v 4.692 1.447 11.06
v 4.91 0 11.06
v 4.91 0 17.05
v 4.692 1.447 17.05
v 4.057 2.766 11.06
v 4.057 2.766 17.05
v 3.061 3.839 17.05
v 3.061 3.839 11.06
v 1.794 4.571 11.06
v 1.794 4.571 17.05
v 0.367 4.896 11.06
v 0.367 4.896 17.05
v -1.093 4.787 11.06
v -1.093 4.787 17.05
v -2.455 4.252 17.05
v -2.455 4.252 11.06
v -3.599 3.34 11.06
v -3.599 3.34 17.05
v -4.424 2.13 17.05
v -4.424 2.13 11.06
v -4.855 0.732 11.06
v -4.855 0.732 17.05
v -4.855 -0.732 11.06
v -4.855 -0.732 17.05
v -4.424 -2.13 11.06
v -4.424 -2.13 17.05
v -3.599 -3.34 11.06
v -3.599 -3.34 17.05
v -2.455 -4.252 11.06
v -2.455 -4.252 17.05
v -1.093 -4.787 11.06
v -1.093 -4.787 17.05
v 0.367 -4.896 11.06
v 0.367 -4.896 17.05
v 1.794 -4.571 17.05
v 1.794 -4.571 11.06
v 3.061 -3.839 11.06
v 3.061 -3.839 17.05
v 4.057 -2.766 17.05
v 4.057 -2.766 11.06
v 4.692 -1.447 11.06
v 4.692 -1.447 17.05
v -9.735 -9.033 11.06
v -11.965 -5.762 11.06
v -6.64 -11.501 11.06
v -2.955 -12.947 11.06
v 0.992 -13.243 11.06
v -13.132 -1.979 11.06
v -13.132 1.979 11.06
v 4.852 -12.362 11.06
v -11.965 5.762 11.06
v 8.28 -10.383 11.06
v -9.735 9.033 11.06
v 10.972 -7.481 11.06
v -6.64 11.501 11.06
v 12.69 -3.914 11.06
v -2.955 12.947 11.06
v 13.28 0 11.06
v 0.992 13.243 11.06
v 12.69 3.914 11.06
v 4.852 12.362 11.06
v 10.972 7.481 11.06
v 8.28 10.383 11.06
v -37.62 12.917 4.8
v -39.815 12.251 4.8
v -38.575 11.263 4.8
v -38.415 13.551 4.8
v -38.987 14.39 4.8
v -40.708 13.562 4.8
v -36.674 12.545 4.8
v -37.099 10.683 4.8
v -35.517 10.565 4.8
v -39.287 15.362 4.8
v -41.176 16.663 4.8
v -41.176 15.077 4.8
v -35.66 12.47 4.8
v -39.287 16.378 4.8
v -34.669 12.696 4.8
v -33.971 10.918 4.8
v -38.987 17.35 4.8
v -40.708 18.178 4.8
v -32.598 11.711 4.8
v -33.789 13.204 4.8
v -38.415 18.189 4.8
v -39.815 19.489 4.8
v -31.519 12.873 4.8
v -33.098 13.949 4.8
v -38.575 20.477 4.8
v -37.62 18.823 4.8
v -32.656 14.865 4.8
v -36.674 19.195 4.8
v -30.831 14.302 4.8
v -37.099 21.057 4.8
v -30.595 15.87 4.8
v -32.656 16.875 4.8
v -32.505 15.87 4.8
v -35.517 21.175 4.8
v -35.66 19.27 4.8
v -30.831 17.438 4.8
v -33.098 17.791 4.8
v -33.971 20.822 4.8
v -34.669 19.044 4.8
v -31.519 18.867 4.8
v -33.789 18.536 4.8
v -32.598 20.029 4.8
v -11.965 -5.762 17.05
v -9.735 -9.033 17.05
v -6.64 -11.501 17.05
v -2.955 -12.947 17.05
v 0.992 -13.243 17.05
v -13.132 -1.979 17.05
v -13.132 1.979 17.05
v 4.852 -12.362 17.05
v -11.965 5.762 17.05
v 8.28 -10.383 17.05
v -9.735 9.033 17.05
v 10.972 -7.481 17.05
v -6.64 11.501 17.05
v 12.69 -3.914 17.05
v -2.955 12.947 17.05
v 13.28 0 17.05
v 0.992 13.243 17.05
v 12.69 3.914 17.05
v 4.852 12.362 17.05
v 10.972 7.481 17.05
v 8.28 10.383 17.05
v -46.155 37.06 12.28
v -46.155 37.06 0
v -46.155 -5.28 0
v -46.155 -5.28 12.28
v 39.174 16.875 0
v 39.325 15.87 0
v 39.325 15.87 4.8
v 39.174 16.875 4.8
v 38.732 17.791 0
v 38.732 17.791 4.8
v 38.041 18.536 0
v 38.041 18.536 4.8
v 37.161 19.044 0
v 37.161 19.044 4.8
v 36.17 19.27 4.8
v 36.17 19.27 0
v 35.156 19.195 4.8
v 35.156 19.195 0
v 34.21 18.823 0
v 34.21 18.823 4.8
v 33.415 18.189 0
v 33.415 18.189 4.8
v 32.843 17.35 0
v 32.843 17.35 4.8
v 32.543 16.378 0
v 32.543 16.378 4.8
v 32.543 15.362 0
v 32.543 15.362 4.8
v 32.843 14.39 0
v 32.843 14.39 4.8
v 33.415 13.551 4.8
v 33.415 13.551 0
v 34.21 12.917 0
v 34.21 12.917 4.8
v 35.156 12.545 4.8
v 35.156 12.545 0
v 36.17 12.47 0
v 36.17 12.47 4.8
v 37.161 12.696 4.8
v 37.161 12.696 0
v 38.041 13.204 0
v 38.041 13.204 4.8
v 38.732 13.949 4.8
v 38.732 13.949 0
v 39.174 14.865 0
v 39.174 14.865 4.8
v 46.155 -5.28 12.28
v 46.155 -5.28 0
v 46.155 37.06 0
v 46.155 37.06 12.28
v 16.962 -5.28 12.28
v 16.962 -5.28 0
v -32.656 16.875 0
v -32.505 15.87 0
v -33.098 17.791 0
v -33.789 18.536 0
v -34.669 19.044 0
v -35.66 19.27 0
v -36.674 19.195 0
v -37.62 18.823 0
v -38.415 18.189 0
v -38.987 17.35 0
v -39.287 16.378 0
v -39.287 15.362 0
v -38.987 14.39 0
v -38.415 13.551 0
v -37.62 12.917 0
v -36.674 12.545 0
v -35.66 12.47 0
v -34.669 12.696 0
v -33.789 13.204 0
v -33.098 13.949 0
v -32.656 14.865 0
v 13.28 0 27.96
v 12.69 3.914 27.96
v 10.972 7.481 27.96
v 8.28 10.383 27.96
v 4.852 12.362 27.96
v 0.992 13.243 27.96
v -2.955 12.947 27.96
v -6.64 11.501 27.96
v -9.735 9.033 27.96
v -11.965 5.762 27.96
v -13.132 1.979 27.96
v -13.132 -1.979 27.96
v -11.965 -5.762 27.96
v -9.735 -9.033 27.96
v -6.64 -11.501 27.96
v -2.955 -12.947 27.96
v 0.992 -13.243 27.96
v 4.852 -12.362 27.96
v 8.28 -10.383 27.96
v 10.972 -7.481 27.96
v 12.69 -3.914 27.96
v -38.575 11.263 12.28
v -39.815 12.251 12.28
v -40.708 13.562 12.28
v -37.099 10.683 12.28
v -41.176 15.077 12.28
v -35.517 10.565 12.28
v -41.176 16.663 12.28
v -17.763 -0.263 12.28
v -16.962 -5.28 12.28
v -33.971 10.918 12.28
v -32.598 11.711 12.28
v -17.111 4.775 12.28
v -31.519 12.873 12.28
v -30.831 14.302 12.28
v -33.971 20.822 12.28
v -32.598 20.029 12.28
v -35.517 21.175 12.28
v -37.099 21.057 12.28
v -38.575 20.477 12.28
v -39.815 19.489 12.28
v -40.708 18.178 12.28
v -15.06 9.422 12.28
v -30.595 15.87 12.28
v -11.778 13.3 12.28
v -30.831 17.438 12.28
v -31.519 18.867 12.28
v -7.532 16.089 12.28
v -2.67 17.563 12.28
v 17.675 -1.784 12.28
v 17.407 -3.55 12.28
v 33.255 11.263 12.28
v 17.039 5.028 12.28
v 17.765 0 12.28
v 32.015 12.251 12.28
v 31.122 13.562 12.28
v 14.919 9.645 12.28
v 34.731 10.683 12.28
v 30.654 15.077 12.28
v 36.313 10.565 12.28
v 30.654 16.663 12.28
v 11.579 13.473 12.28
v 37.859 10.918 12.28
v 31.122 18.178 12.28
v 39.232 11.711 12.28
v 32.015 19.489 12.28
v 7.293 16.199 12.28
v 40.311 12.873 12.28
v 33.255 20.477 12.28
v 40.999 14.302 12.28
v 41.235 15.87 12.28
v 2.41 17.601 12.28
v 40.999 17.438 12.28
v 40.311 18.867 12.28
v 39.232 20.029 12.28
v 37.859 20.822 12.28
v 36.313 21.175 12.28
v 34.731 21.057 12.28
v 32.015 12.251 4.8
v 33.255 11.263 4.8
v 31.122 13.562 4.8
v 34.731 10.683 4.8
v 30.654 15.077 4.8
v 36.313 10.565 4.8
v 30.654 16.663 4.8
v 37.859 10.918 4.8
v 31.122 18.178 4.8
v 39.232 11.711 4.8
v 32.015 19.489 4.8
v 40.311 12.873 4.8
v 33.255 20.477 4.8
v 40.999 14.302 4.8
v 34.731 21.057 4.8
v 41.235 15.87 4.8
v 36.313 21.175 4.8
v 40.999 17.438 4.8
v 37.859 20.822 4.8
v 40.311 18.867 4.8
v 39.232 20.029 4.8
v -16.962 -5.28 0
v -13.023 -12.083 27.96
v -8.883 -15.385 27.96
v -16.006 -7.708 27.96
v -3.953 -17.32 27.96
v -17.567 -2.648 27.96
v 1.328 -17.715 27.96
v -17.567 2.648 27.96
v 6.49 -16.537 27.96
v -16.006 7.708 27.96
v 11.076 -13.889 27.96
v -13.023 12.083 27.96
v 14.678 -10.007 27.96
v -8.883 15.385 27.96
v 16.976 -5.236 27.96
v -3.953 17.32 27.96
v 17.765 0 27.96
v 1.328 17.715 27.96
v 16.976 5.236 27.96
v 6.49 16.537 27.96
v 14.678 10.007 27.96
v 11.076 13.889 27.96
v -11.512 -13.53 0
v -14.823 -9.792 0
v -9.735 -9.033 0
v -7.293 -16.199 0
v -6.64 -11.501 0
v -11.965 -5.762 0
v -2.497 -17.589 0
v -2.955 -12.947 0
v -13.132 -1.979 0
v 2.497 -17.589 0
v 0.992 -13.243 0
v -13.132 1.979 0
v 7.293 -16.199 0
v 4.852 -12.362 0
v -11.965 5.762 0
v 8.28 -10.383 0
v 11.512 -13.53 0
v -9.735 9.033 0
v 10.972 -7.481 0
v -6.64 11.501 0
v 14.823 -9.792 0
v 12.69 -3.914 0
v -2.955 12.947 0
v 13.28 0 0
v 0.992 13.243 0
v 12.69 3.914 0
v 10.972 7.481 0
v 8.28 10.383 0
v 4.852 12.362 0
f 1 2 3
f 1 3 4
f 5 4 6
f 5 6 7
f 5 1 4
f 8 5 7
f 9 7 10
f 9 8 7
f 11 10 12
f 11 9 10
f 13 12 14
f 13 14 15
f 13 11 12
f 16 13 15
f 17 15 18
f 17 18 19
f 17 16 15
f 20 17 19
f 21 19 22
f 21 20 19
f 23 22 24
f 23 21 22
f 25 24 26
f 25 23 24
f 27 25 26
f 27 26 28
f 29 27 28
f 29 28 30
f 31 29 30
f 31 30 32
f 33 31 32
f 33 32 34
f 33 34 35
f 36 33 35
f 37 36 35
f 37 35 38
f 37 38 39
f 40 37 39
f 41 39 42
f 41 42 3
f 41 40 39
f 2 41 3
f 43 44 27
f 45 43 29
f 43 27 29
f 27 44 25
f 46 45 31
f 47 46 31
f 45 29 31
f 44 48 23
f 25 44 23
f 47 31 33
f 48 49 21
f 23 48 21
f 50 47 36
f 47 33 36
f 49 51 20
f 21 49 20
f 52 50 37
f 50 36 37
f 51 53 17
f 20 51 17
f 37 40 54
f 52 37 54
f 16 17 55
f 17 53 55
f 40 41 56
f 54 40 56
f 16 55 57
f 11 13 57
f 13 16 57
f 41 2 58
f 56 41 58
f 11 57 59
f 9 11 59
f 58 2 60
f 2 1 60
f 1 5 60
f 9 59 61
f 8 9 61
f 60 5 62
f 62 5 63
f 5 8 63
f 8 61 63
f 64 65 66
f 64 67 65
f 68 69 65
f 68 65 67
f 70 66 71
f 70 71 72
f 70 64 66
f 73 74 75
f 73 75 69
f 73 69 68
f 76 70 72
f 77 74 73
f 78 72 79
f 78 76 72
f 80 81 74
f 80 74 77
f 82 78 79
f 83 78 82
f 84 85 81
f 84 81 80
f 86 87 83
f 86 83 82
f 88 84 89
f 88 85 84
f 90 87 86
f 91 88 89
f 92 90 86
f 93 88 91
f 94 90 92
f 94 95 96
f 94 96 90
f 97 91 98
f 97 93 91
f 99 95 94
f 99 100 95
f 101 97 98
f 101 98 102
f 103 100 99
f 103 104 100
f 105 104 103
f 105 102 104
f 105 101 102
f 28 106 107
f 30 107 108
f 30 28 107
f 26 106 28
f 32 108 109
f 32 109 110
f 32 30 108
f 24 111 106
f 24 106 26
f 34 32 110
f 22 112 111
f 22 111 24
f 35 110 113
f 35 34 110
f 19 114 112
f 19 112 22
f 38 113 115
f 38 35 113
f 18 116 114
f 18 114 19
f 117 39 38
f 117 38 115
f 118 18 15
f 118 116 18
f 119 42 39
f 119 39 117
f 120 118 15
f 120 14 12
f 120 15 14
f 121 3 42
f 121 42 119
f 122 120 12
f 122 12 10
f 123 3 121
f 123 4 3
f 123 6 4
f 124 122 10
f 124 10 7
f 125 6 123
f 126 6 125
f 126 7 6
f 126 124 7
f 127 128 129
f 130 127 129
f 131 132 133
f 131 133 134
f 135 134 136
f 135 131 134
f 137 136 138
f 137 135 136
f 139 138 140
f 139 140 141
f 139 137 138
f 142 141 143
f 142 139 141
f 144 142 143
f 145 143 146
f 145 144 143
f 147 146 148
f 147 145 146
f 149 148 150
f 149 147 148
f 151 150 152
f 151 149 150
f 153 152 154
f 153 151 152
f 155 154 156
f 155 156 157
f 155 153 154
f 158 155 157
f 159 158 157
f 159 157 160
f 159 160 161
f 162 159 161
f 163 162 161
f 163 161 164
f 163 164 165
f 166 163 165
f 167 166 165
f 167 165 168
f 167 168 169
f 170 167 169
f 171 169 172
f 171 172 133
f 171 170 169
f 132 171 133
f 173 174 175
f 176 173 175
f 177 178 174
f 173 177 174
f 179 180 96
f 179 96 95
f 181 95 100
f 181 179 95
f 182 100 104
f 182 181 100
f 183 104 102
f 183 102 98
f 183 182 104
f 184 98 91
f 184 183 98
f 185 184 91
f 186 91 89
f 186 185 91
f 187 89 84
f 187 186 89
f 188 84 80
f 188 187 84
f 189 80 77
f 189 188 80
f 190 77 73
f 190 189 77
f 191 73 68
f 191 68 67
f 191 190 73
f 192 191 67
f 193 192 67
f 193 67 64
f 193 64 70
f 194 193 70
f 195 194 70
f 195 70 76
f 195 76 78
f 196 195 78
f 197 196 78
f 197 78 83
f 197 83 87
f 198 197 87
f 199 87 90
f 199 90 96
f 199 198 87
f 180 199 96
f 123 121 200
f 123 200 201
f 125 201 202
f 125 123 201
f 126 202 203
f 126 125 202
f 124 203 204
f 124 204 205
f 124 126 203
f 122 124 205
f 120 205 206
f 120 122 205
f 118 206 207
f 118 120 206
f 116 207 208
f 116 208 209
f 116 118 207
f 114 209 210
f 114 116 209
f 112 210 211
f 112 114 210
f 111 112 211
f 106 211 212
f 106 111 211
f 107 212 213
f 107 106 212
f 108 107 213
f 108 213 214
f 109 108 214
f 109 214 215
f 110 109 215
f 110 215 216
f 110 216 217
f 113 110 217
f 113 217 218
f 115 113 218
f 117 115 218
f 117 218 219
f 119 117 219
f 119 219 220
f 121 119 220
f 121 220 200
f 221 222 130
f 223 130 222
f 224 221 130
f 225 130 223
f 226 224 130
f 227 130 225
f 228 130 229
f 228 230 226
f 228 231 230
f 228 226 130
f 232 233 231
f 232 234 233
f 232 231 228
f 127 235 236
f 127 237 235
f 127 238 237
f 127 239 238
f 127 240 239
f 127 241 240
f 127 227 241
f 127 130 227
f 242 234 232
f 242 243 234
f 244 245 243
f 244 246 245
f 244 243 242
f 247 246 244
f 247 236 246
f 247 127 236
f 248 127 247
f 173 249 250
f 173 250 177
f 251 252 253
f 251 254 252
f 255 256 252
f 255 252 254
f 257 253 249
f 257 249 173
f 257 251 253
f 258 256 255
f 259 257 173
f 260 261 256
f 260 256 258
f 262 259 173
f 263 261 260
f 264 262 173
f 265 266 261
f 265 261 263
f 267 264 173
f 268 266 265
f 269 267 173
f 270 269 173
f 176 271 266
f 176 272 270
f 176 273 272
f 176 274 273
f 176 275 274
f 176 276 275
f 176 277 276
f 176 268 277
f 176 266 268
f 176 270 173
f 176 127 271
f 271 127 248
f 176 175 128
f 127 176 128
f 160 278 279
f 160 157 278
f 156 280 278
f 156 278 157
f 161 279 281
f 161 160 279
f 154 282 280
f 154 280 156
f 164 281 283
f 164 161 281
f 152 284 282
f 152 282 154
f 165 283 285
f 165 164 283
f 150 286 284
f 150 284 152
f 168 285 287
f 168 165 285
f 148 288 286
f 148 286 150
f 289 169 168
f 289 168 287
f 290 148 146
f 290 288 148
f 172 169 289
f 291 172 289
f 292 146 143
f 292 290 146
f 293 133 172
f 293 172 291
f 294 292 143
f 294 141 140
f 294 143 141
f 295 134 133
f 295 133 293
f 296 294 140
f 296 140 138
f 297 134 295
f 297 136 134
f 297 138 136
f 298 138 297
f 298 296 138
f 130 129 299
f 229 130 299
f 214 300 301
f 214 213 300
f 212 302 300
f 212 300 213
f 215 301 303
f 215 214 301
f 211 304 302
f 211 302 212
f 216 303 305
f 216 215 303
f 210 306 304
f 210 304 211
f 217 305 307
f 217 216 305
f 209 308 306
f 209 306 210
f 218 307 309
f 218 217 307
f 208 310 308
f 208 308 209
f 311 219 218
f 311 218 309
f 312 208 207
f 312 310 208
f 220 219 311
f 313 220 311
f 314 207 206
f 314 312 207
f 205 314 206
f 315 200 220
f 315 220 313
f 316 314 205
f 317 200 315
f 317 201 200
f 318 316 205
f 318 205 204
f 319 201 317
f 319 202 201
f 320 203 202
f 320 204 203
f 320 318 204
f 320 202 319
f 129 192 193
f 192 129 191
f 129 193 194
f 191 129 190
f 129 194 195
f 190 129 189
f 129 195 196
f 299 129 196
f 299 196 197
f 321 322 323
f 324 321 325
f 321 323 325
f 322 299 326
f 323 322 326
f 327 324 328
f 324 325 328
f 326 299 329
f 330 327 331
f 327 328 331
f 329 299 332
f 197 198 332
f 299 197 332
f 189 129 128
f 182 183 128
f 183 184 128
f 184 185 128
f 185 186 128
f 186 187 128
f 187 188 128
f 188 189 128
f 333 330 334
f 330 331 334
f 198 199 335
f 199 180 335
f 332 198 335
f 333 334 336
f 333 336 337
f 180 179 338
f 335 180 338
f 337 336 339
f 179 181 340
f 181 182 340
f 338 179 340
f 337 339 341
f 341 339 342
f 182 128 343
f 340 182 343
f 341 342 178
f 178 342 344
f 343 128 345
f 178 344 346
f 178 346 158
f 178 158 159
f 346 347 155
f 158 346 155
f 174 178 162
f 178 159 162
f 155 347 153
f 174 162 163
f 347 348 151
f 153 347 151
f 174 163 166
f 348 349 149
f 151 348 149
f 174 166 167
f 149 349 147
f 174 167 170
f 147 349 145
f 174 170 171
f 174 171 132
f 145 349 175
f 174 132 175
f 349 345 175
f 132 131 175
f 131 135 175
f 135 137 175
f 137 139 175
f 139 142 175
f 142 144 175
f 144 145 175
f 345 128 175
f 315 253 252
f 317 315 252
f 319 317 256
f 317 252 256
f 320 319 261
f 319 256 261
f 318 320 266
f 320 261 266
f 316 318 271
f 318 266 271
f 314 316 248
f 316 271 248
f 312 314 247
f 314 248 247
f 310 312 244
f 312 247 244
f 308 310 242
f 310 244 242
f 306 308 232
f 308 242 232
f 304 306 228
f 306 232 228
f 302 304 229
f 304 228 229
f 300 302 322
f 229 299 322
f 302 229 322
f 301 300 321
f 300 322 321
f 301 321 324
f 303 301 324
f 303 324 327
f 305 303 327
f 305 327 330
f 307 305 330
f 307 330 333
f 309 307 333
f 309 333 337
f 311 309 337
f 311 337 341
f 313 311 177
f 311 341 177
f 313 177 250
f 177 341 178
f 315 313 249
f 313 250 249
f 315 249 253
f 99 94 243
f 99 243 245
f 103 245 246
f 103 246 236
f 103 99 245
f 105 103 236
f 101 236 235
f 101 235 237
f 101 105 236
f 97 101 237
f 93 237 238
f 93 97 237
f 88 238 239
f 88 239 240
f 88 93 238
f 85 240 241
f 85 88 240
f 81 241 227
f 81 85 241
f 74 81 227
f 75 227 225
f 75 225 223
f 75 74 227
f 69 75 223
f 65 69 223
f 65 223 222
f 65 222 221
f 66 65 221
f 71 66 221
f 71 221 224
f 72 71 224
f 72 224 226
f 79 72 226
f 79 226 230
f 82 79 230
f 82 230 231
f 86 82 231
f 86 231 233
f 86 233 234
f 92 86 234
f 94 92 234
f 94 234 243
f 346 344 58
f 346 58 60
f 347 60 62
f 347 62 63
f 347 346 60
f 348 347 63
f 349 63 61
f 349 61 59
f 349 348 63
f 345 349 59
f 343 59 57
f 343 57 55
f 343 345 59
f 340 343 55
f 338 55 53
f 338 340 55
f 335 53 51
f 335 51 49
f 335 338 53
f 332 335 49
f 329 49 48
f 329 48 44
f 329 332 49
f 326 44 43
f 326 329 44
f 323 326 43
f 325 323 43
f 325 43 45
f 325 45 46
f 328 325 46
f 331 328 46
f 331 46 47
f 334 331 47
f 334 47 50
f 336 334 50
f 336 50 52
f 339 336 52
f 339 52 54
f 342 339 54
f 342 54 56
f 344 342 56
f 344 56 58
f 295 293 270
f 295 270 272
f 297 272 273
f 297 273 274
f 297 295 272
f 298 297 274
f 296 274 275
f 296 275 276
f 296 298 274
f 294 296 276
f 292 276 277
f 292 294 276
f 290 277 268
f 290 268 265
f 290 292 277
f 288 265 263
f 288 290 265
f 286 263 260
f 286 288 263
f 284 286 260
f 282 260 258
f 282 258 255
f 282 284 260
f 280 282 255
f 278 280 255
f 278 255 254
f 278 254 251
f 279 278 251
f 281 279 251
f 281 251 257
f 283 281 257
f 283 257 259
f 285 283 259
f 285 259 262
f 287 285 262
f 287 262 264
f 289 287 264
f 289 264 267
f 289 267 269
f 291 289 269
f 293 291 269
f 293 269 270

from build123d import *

# Parameters (mm, degrees)
F0_R     = 17.765
F0_R_2   = 13.28
F1_DEPTH = 27.96
F2_START = 11.06
F0_R_3   = 4.91
F2_DEPTH = 5.99
F3_R     = 5.32
F4_DEPTH = 12.28
F3_R_2   = 3.41
F5_DEPTH = 4.8


with BuildPart() as f1:
    # F0 (on Top) → F1 (new body)
    with BuildSketch(Plane.XY):
        Circle(F0_R)
        Circle(F0_R_2, mode=Mode.SUBTRACT)
    extrude(amount=F1_DEPTH)

    # F0 (on Top) → F2 (join)
    with BuildSketch(Plane.XY.offset(F2_START)):
        Circle(F0_R_2)
        Circle(F0_R_3, mode=Mode.SUBTRACT)
    extrude(amount=F2_DEPTH)

    # F3 (on Top) → F4 (join)
    with BuildSketch(Plane.XY):
        with BuildLine():
            Line((46.155, -5.28), (46.155, 37.06))
            Line((46.155, 37.06), (-46.155, 37.06))
            Line((-46.155, 37.06), (-46.155, -5.28))
            Line((-46.155, -5.28), (-12.1852369694, -5.28))
            ThreePointArc((-12.1852369694, -5.28), (-2.6961503154, 13.0034292968), (13.28, 0))
            ThreePointArc((13.28, 0), (13.0034292968, -2.6961503154), (12.1852369694, -5.28))
            Line((12.1852369694, -5.28), (46.155, -5.28))
        make_face()
        with Locations((-35.915, 15.87)):
            Circle(F3_R, mode=Mode.SUBTRACT)
        with Locations((35.915, 15.87)):
            Circle(F3_R, mode=Mode.SUBTRACT)
    extrude(amount=F4_DEPTH)

    # F3 (on Top) → F5 (join)
    with BuildSketch(Plane.XY):
        with Locations((-35.915, 15.87)):
            Circle(F3_R)
        with Locations((-35.915, 15.87)):
            Circle(F3_R_2, mode=Mode.SUBTRACT)
        with Locations((35.915, 15.87)):
            Circle(F3_R)
        with Locations((35.915, 15.87)):
            Circle(F3_R_2, mode=Mode.SUBTRACT)
    extrude(amount=F5_DEPTH)


solid = f1.part
